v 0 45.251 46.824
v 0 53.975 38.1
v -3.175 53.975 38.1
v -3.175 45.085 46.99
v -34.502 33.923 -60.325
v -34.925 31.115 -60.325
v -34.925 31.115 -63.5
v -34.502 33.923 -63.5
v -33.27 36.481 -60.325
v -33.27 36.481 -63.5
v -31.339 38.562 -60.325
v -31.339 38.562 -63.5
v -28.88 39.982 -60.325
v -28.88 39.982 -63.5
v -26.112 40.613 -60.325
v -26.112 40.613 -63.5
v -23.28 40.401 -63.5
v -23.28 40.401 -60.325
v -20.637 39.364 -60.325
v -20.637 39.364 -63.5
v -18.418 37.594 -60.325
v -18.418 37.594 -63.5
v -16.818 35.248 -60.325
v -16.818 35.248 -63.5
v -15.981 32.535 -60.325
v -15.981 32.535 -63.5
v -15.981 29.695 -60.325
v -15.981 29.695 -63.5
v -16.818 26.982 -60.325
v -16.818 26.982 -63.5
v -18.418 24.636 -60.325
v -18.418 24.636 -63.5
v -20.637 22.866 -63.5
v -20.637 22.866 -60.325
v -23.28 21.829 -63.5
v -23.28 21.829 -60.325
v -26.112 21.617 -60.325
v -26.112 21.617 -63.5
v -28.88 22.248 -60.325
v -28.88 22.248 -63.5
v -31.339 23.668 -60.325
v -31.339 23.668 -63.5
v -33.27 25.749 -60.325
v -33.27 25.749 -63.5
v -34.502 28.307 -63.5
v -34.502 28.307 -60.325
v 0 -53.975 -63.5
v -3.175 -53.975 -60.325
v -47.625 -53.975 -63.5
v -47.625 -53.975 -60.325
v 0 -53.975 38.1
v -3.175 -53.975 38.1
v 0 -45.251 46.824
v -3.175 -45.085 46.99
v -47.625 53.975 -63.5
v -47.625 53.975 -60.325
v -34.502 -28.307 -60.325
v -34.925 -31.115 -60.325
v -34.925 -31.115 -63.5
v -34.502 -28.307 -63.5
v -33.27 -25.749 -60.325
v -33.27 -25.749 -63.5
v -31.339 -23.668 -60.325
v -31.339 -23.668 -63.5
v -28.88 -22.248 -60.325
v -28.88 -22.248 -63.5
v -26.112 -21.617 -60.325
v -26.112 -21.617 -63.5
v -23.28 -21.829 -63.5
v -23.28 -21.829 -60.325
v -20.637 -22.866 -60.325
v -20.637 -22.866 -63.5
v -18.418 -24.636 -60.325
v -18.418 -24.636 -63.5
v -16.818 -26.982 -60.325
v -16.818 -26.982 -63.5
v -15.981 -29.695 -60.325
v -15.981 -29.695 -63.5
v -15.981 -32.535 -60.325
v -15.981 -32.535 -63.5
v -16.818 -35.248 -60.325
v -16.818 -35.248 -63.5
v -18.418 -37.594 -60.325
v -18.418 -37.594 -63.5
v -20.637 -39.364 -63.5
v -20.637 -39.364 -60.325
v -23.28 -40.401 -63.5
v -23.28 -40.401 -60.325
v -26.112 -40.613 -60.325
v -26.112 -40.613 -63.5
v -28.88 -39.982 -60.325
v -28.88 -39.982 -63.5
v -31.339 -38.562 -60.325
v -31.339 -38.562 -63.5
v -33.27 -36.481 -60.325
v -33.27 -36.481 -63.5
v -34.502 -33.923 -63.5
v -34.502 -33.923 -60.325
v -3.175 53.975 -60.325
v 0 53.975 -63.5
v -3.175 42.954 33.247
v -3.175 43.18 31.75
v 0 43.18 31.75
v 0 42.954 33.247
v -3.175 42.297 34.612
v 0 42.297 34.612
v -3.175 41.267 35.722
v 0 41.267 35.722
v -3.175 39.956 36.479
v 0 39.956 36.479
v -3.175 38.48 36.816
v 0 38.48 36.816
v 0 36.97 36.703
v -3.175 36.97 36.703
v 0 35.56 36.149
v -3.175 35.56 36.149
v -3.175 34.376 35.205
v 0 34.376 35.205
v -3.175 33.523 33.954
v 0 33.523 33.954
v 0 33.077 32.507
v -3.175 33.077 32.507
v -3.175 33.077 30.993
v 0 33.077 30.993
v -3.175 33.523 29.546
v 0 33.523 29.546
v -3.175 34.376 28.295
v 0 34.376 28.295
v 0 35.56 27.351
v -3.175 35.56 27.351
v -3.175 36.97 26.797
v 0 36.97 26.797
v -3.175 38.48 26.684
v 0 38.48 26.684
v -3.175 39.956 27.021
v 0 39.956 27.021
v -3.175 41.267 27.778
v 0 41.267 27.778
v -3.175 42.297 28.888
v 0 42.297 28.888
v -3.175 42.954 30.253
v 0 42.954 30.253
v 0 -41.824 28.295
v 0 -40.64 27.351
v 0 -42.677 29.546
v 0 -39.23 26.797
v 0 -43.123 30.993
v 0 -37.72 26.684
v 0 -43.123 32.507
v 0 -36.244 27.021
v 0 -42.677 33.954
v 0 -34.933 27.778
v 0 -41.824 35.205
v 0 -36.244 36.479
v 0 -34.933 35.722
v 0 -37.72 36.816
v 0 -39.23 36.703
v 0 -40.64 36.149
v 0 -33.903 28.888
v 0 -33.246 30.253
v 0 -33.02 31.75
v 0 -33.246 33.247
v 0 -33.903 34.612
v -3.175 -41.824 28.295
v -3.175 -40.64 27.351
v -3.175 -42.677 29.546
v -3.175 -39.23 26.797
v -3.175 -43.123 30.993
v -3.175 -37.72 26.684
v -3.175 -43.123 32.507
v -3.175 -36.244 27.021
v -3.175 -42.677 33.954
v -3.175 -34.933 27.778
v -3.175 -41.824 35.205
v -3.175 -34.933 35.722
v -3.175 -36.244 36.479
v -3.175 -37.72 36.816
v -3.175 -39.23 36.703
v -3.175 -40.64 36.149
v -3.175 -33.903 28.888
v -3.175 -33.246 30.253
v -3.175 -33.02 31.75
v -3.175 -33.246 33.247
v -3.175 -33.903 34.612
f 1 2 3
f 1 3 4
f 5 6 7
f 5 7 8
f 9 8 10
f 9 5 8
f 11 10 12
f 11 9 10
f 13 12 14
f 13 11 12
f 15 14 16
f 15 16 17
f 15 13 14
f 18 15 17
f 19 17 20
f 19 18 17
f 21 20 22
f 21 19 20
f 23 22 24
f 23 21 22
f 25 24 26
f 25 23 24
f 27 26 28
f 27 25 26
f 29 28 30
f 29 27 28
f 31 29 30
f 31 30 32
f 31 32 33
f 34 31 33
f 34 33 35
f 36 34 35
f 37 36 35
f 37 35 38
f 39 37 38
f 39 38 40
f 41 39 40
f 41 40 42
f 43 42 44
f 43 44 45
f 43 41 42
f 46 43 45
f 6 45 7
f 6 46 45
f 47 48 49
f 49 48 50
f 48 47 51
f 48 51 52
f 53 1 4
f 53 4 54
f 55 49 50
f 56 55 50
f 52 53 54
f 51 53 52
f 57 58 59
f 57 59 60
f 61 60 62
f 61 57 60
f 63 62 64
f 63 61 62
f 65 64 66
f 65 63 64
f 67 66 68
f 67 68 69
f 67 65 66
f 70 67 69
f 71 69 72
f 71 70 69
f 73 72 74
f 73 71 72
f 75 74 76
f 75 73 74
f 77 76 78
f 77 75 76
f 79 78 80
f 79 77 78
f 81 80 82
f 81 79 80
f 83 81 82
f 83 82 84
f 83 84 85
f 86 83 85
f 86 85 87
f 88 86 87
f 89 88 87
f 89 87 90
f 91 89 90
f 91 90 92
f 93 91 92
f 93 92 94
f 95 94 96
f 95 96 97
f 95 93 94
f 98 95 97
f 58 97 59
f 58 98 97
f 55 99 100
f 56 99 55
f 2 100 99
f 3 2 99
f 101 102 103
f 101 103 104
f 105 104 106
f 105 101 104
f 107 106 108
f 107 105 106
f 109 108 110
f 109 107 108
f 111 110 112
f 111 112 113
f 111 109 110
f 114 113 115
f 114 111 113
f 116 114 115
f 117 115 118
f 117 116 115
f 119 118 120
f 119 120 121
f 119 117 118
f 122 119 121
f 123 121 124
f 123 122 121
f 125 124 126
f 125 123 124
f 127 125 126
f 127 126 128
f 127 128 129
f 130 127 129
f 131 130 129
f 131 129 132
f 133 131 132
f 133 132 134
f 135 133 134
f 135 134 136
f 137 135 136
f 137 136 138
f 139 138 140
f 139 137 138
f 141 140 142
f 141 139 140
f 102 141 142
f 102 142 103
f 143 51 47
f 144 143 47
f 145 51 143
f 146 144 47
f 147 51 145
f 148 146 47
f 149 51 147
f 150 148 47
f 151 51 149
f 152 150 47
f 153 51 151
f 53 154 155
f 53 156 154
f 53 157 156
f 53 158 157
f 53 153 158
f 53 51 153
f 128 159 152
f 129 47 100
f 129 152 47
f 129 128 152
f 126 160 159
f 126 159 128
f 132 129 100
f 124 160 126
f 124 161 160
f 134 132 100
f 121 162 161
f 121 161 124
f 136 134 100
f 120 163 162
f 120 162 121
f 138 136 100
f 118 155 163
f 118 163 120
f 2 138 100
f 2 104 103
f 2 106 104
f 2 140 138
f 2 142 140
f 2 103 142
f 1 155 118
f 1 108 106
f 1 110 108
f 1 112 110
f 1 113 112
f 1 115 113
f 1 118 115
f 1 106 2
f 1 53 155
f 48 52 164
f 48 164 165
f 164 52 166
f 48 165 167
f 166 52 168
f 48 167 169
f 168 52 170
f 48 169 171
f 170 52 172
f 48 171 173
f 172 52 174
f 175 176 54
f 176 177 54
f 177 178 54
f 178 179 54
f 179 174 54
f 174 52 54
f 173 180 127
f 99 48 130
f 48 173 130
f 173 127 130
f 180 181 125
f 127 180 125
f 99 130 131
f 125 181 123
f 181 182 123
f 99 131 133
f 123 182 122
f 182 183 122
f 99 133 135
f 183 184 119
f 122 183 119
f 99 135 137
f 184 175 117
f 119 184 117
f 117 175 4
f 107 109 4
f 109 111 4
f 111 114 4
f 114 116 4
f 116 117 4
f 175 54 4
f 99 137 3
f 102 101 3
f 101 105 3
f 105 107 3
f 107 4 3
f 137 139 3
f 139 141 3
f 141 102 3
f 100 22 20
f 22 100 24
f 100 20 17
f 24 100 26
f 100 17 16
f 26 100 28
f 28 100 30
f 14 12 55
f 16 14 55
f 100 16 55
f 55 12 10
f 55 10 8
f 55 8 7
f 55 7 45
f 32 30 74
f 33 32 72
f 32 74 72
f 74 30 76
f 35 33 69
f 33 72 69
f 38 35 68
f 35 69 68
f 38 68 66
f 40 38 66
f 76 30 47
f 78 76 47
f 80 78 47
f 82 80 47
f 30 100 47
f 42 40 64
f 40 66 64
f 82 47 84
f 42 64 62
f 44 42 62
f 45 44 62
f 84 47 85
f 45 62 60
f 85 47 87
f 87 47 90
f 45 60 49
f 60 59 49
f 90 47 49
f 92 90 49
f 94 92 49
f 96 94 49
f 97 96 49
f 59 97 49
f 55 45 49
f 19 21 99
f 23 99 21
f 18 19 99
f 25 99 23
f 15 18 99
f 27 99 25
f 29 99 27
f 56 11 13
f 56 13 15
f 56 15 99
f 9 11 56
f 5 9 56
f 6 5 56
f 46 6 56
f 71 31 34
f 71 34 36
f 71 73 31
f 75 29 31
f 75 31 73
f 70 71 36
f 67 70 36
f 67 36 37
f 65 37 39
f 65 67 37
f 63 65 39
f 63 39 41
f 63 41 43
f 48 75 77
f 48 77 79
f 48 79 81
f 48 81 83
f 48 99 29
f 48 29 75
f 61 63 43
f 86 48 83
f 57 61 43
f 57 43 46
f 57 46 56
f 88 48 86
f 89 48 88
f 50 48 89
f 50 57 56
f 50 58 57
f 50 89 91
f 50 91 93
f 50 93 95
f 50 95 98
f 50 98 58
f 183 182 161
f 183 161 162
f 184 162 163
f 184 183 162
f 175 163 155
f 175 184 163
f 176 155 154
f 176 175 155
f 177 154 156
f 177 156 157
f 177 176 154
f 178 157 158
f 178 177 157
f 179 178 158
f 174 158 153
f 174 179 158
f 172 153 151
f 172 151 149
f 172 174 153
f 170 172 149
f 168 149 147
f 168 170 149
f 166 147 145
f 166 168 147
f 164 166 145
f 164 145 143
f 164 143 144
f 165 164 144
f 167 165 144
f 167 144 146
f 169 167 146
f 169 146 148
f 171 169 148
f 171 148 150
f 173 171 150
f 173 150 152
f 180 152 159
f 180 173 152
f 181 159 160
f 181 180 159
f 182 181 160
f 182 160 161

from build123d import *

# Parameters (mm, degrees)
F1_DEPTH  = 3.175
F2_W      = 44.45
F2_H      = 3.175
F3_DEPTH  = 107.95
F4_R      = 5.08
F5_DEPTH  = 3.175
F6_R      = 9.525
F7_DEPTH  = 3.175
F8_DEPTH  = 3.175
F12_DEPTH = 3.175
F12_TAPER = -3


with BuildPart() as f1:
    # F0 (on Right) → F1 (new body)
    with BuildSketch(Plane.YZ):
        Polygon((53.975, 38.1), (28.575, 63.5), (-28.575, 63.5), (-53.975, 38.1), (-53.975, -63.5), (53.975, -63.5), align=None)
    extrude(amount=F1_DEPTH)

    # F2 (on face) → F3 (join, through all)
    with BuildSketch(Plane.XZ.offset(53.975)):
        with Locations((25.4, -61.9125)):
            Rectangle(F2_W, F2_H)
    extrude(amount=-F3_DEPTH)

    # F4 (on face) → F5 (cut, through all)
    with BuildSketch(Plane.YZ.offset(3.175)):
        with Locations((-38.1, 31.75)):
            Circle(F4_R)
        with Locations((38.1, 31.75)):
            Circle(F4_R)
    extrude(amount=-F5_DEPTH, mode=Mode.SUBTRACT)

    # F6 (on face) → F7 (cut, through all)
    with BuildSketch(Plane.XY.offset(-60.325)):
        with Locations((25.4, 31.115)):
            Circle(F6_R)
        with Locations((25.4, -31.115)):
            Circle(F6_R)
    extrude(amount=-F7_DEPTH, mode=Mode.SUBTRACT)

    # F6 (on face) → F8 (cut, through all)
    with BuildSketch(Plane.XY.offset(-60.325)):
        with Locations((25.4, 31.115)):
            Circle(F6_R)
        with Locations((25.4, -31.115)):
            Circle(F6_R)
    extrude(amount=-F8_DEPTH, mode=Mode.SUBTRACT)


with BuildPart() as f9_1:
    # F9: instance of F1
    add(f1.part.mirror(Plane.YZ))

    # F11 (on face) → F12 (cut, through all)
    with BuildSketch(Plane(origin=(-3.175, 0, 0), x_dir=(0, -1, 0), z_dir=(-1, 0, 0))):
        Polygon((28.575, 63.5), (-28.575, 63.5), (-45.085, 46.99), (45.085, 46.99), align=None)
    extrude(amount=-F12_DEPTH, taper=F12_TAPER, mode=Mode.SUBTRACT)


solid = f9_1.part
